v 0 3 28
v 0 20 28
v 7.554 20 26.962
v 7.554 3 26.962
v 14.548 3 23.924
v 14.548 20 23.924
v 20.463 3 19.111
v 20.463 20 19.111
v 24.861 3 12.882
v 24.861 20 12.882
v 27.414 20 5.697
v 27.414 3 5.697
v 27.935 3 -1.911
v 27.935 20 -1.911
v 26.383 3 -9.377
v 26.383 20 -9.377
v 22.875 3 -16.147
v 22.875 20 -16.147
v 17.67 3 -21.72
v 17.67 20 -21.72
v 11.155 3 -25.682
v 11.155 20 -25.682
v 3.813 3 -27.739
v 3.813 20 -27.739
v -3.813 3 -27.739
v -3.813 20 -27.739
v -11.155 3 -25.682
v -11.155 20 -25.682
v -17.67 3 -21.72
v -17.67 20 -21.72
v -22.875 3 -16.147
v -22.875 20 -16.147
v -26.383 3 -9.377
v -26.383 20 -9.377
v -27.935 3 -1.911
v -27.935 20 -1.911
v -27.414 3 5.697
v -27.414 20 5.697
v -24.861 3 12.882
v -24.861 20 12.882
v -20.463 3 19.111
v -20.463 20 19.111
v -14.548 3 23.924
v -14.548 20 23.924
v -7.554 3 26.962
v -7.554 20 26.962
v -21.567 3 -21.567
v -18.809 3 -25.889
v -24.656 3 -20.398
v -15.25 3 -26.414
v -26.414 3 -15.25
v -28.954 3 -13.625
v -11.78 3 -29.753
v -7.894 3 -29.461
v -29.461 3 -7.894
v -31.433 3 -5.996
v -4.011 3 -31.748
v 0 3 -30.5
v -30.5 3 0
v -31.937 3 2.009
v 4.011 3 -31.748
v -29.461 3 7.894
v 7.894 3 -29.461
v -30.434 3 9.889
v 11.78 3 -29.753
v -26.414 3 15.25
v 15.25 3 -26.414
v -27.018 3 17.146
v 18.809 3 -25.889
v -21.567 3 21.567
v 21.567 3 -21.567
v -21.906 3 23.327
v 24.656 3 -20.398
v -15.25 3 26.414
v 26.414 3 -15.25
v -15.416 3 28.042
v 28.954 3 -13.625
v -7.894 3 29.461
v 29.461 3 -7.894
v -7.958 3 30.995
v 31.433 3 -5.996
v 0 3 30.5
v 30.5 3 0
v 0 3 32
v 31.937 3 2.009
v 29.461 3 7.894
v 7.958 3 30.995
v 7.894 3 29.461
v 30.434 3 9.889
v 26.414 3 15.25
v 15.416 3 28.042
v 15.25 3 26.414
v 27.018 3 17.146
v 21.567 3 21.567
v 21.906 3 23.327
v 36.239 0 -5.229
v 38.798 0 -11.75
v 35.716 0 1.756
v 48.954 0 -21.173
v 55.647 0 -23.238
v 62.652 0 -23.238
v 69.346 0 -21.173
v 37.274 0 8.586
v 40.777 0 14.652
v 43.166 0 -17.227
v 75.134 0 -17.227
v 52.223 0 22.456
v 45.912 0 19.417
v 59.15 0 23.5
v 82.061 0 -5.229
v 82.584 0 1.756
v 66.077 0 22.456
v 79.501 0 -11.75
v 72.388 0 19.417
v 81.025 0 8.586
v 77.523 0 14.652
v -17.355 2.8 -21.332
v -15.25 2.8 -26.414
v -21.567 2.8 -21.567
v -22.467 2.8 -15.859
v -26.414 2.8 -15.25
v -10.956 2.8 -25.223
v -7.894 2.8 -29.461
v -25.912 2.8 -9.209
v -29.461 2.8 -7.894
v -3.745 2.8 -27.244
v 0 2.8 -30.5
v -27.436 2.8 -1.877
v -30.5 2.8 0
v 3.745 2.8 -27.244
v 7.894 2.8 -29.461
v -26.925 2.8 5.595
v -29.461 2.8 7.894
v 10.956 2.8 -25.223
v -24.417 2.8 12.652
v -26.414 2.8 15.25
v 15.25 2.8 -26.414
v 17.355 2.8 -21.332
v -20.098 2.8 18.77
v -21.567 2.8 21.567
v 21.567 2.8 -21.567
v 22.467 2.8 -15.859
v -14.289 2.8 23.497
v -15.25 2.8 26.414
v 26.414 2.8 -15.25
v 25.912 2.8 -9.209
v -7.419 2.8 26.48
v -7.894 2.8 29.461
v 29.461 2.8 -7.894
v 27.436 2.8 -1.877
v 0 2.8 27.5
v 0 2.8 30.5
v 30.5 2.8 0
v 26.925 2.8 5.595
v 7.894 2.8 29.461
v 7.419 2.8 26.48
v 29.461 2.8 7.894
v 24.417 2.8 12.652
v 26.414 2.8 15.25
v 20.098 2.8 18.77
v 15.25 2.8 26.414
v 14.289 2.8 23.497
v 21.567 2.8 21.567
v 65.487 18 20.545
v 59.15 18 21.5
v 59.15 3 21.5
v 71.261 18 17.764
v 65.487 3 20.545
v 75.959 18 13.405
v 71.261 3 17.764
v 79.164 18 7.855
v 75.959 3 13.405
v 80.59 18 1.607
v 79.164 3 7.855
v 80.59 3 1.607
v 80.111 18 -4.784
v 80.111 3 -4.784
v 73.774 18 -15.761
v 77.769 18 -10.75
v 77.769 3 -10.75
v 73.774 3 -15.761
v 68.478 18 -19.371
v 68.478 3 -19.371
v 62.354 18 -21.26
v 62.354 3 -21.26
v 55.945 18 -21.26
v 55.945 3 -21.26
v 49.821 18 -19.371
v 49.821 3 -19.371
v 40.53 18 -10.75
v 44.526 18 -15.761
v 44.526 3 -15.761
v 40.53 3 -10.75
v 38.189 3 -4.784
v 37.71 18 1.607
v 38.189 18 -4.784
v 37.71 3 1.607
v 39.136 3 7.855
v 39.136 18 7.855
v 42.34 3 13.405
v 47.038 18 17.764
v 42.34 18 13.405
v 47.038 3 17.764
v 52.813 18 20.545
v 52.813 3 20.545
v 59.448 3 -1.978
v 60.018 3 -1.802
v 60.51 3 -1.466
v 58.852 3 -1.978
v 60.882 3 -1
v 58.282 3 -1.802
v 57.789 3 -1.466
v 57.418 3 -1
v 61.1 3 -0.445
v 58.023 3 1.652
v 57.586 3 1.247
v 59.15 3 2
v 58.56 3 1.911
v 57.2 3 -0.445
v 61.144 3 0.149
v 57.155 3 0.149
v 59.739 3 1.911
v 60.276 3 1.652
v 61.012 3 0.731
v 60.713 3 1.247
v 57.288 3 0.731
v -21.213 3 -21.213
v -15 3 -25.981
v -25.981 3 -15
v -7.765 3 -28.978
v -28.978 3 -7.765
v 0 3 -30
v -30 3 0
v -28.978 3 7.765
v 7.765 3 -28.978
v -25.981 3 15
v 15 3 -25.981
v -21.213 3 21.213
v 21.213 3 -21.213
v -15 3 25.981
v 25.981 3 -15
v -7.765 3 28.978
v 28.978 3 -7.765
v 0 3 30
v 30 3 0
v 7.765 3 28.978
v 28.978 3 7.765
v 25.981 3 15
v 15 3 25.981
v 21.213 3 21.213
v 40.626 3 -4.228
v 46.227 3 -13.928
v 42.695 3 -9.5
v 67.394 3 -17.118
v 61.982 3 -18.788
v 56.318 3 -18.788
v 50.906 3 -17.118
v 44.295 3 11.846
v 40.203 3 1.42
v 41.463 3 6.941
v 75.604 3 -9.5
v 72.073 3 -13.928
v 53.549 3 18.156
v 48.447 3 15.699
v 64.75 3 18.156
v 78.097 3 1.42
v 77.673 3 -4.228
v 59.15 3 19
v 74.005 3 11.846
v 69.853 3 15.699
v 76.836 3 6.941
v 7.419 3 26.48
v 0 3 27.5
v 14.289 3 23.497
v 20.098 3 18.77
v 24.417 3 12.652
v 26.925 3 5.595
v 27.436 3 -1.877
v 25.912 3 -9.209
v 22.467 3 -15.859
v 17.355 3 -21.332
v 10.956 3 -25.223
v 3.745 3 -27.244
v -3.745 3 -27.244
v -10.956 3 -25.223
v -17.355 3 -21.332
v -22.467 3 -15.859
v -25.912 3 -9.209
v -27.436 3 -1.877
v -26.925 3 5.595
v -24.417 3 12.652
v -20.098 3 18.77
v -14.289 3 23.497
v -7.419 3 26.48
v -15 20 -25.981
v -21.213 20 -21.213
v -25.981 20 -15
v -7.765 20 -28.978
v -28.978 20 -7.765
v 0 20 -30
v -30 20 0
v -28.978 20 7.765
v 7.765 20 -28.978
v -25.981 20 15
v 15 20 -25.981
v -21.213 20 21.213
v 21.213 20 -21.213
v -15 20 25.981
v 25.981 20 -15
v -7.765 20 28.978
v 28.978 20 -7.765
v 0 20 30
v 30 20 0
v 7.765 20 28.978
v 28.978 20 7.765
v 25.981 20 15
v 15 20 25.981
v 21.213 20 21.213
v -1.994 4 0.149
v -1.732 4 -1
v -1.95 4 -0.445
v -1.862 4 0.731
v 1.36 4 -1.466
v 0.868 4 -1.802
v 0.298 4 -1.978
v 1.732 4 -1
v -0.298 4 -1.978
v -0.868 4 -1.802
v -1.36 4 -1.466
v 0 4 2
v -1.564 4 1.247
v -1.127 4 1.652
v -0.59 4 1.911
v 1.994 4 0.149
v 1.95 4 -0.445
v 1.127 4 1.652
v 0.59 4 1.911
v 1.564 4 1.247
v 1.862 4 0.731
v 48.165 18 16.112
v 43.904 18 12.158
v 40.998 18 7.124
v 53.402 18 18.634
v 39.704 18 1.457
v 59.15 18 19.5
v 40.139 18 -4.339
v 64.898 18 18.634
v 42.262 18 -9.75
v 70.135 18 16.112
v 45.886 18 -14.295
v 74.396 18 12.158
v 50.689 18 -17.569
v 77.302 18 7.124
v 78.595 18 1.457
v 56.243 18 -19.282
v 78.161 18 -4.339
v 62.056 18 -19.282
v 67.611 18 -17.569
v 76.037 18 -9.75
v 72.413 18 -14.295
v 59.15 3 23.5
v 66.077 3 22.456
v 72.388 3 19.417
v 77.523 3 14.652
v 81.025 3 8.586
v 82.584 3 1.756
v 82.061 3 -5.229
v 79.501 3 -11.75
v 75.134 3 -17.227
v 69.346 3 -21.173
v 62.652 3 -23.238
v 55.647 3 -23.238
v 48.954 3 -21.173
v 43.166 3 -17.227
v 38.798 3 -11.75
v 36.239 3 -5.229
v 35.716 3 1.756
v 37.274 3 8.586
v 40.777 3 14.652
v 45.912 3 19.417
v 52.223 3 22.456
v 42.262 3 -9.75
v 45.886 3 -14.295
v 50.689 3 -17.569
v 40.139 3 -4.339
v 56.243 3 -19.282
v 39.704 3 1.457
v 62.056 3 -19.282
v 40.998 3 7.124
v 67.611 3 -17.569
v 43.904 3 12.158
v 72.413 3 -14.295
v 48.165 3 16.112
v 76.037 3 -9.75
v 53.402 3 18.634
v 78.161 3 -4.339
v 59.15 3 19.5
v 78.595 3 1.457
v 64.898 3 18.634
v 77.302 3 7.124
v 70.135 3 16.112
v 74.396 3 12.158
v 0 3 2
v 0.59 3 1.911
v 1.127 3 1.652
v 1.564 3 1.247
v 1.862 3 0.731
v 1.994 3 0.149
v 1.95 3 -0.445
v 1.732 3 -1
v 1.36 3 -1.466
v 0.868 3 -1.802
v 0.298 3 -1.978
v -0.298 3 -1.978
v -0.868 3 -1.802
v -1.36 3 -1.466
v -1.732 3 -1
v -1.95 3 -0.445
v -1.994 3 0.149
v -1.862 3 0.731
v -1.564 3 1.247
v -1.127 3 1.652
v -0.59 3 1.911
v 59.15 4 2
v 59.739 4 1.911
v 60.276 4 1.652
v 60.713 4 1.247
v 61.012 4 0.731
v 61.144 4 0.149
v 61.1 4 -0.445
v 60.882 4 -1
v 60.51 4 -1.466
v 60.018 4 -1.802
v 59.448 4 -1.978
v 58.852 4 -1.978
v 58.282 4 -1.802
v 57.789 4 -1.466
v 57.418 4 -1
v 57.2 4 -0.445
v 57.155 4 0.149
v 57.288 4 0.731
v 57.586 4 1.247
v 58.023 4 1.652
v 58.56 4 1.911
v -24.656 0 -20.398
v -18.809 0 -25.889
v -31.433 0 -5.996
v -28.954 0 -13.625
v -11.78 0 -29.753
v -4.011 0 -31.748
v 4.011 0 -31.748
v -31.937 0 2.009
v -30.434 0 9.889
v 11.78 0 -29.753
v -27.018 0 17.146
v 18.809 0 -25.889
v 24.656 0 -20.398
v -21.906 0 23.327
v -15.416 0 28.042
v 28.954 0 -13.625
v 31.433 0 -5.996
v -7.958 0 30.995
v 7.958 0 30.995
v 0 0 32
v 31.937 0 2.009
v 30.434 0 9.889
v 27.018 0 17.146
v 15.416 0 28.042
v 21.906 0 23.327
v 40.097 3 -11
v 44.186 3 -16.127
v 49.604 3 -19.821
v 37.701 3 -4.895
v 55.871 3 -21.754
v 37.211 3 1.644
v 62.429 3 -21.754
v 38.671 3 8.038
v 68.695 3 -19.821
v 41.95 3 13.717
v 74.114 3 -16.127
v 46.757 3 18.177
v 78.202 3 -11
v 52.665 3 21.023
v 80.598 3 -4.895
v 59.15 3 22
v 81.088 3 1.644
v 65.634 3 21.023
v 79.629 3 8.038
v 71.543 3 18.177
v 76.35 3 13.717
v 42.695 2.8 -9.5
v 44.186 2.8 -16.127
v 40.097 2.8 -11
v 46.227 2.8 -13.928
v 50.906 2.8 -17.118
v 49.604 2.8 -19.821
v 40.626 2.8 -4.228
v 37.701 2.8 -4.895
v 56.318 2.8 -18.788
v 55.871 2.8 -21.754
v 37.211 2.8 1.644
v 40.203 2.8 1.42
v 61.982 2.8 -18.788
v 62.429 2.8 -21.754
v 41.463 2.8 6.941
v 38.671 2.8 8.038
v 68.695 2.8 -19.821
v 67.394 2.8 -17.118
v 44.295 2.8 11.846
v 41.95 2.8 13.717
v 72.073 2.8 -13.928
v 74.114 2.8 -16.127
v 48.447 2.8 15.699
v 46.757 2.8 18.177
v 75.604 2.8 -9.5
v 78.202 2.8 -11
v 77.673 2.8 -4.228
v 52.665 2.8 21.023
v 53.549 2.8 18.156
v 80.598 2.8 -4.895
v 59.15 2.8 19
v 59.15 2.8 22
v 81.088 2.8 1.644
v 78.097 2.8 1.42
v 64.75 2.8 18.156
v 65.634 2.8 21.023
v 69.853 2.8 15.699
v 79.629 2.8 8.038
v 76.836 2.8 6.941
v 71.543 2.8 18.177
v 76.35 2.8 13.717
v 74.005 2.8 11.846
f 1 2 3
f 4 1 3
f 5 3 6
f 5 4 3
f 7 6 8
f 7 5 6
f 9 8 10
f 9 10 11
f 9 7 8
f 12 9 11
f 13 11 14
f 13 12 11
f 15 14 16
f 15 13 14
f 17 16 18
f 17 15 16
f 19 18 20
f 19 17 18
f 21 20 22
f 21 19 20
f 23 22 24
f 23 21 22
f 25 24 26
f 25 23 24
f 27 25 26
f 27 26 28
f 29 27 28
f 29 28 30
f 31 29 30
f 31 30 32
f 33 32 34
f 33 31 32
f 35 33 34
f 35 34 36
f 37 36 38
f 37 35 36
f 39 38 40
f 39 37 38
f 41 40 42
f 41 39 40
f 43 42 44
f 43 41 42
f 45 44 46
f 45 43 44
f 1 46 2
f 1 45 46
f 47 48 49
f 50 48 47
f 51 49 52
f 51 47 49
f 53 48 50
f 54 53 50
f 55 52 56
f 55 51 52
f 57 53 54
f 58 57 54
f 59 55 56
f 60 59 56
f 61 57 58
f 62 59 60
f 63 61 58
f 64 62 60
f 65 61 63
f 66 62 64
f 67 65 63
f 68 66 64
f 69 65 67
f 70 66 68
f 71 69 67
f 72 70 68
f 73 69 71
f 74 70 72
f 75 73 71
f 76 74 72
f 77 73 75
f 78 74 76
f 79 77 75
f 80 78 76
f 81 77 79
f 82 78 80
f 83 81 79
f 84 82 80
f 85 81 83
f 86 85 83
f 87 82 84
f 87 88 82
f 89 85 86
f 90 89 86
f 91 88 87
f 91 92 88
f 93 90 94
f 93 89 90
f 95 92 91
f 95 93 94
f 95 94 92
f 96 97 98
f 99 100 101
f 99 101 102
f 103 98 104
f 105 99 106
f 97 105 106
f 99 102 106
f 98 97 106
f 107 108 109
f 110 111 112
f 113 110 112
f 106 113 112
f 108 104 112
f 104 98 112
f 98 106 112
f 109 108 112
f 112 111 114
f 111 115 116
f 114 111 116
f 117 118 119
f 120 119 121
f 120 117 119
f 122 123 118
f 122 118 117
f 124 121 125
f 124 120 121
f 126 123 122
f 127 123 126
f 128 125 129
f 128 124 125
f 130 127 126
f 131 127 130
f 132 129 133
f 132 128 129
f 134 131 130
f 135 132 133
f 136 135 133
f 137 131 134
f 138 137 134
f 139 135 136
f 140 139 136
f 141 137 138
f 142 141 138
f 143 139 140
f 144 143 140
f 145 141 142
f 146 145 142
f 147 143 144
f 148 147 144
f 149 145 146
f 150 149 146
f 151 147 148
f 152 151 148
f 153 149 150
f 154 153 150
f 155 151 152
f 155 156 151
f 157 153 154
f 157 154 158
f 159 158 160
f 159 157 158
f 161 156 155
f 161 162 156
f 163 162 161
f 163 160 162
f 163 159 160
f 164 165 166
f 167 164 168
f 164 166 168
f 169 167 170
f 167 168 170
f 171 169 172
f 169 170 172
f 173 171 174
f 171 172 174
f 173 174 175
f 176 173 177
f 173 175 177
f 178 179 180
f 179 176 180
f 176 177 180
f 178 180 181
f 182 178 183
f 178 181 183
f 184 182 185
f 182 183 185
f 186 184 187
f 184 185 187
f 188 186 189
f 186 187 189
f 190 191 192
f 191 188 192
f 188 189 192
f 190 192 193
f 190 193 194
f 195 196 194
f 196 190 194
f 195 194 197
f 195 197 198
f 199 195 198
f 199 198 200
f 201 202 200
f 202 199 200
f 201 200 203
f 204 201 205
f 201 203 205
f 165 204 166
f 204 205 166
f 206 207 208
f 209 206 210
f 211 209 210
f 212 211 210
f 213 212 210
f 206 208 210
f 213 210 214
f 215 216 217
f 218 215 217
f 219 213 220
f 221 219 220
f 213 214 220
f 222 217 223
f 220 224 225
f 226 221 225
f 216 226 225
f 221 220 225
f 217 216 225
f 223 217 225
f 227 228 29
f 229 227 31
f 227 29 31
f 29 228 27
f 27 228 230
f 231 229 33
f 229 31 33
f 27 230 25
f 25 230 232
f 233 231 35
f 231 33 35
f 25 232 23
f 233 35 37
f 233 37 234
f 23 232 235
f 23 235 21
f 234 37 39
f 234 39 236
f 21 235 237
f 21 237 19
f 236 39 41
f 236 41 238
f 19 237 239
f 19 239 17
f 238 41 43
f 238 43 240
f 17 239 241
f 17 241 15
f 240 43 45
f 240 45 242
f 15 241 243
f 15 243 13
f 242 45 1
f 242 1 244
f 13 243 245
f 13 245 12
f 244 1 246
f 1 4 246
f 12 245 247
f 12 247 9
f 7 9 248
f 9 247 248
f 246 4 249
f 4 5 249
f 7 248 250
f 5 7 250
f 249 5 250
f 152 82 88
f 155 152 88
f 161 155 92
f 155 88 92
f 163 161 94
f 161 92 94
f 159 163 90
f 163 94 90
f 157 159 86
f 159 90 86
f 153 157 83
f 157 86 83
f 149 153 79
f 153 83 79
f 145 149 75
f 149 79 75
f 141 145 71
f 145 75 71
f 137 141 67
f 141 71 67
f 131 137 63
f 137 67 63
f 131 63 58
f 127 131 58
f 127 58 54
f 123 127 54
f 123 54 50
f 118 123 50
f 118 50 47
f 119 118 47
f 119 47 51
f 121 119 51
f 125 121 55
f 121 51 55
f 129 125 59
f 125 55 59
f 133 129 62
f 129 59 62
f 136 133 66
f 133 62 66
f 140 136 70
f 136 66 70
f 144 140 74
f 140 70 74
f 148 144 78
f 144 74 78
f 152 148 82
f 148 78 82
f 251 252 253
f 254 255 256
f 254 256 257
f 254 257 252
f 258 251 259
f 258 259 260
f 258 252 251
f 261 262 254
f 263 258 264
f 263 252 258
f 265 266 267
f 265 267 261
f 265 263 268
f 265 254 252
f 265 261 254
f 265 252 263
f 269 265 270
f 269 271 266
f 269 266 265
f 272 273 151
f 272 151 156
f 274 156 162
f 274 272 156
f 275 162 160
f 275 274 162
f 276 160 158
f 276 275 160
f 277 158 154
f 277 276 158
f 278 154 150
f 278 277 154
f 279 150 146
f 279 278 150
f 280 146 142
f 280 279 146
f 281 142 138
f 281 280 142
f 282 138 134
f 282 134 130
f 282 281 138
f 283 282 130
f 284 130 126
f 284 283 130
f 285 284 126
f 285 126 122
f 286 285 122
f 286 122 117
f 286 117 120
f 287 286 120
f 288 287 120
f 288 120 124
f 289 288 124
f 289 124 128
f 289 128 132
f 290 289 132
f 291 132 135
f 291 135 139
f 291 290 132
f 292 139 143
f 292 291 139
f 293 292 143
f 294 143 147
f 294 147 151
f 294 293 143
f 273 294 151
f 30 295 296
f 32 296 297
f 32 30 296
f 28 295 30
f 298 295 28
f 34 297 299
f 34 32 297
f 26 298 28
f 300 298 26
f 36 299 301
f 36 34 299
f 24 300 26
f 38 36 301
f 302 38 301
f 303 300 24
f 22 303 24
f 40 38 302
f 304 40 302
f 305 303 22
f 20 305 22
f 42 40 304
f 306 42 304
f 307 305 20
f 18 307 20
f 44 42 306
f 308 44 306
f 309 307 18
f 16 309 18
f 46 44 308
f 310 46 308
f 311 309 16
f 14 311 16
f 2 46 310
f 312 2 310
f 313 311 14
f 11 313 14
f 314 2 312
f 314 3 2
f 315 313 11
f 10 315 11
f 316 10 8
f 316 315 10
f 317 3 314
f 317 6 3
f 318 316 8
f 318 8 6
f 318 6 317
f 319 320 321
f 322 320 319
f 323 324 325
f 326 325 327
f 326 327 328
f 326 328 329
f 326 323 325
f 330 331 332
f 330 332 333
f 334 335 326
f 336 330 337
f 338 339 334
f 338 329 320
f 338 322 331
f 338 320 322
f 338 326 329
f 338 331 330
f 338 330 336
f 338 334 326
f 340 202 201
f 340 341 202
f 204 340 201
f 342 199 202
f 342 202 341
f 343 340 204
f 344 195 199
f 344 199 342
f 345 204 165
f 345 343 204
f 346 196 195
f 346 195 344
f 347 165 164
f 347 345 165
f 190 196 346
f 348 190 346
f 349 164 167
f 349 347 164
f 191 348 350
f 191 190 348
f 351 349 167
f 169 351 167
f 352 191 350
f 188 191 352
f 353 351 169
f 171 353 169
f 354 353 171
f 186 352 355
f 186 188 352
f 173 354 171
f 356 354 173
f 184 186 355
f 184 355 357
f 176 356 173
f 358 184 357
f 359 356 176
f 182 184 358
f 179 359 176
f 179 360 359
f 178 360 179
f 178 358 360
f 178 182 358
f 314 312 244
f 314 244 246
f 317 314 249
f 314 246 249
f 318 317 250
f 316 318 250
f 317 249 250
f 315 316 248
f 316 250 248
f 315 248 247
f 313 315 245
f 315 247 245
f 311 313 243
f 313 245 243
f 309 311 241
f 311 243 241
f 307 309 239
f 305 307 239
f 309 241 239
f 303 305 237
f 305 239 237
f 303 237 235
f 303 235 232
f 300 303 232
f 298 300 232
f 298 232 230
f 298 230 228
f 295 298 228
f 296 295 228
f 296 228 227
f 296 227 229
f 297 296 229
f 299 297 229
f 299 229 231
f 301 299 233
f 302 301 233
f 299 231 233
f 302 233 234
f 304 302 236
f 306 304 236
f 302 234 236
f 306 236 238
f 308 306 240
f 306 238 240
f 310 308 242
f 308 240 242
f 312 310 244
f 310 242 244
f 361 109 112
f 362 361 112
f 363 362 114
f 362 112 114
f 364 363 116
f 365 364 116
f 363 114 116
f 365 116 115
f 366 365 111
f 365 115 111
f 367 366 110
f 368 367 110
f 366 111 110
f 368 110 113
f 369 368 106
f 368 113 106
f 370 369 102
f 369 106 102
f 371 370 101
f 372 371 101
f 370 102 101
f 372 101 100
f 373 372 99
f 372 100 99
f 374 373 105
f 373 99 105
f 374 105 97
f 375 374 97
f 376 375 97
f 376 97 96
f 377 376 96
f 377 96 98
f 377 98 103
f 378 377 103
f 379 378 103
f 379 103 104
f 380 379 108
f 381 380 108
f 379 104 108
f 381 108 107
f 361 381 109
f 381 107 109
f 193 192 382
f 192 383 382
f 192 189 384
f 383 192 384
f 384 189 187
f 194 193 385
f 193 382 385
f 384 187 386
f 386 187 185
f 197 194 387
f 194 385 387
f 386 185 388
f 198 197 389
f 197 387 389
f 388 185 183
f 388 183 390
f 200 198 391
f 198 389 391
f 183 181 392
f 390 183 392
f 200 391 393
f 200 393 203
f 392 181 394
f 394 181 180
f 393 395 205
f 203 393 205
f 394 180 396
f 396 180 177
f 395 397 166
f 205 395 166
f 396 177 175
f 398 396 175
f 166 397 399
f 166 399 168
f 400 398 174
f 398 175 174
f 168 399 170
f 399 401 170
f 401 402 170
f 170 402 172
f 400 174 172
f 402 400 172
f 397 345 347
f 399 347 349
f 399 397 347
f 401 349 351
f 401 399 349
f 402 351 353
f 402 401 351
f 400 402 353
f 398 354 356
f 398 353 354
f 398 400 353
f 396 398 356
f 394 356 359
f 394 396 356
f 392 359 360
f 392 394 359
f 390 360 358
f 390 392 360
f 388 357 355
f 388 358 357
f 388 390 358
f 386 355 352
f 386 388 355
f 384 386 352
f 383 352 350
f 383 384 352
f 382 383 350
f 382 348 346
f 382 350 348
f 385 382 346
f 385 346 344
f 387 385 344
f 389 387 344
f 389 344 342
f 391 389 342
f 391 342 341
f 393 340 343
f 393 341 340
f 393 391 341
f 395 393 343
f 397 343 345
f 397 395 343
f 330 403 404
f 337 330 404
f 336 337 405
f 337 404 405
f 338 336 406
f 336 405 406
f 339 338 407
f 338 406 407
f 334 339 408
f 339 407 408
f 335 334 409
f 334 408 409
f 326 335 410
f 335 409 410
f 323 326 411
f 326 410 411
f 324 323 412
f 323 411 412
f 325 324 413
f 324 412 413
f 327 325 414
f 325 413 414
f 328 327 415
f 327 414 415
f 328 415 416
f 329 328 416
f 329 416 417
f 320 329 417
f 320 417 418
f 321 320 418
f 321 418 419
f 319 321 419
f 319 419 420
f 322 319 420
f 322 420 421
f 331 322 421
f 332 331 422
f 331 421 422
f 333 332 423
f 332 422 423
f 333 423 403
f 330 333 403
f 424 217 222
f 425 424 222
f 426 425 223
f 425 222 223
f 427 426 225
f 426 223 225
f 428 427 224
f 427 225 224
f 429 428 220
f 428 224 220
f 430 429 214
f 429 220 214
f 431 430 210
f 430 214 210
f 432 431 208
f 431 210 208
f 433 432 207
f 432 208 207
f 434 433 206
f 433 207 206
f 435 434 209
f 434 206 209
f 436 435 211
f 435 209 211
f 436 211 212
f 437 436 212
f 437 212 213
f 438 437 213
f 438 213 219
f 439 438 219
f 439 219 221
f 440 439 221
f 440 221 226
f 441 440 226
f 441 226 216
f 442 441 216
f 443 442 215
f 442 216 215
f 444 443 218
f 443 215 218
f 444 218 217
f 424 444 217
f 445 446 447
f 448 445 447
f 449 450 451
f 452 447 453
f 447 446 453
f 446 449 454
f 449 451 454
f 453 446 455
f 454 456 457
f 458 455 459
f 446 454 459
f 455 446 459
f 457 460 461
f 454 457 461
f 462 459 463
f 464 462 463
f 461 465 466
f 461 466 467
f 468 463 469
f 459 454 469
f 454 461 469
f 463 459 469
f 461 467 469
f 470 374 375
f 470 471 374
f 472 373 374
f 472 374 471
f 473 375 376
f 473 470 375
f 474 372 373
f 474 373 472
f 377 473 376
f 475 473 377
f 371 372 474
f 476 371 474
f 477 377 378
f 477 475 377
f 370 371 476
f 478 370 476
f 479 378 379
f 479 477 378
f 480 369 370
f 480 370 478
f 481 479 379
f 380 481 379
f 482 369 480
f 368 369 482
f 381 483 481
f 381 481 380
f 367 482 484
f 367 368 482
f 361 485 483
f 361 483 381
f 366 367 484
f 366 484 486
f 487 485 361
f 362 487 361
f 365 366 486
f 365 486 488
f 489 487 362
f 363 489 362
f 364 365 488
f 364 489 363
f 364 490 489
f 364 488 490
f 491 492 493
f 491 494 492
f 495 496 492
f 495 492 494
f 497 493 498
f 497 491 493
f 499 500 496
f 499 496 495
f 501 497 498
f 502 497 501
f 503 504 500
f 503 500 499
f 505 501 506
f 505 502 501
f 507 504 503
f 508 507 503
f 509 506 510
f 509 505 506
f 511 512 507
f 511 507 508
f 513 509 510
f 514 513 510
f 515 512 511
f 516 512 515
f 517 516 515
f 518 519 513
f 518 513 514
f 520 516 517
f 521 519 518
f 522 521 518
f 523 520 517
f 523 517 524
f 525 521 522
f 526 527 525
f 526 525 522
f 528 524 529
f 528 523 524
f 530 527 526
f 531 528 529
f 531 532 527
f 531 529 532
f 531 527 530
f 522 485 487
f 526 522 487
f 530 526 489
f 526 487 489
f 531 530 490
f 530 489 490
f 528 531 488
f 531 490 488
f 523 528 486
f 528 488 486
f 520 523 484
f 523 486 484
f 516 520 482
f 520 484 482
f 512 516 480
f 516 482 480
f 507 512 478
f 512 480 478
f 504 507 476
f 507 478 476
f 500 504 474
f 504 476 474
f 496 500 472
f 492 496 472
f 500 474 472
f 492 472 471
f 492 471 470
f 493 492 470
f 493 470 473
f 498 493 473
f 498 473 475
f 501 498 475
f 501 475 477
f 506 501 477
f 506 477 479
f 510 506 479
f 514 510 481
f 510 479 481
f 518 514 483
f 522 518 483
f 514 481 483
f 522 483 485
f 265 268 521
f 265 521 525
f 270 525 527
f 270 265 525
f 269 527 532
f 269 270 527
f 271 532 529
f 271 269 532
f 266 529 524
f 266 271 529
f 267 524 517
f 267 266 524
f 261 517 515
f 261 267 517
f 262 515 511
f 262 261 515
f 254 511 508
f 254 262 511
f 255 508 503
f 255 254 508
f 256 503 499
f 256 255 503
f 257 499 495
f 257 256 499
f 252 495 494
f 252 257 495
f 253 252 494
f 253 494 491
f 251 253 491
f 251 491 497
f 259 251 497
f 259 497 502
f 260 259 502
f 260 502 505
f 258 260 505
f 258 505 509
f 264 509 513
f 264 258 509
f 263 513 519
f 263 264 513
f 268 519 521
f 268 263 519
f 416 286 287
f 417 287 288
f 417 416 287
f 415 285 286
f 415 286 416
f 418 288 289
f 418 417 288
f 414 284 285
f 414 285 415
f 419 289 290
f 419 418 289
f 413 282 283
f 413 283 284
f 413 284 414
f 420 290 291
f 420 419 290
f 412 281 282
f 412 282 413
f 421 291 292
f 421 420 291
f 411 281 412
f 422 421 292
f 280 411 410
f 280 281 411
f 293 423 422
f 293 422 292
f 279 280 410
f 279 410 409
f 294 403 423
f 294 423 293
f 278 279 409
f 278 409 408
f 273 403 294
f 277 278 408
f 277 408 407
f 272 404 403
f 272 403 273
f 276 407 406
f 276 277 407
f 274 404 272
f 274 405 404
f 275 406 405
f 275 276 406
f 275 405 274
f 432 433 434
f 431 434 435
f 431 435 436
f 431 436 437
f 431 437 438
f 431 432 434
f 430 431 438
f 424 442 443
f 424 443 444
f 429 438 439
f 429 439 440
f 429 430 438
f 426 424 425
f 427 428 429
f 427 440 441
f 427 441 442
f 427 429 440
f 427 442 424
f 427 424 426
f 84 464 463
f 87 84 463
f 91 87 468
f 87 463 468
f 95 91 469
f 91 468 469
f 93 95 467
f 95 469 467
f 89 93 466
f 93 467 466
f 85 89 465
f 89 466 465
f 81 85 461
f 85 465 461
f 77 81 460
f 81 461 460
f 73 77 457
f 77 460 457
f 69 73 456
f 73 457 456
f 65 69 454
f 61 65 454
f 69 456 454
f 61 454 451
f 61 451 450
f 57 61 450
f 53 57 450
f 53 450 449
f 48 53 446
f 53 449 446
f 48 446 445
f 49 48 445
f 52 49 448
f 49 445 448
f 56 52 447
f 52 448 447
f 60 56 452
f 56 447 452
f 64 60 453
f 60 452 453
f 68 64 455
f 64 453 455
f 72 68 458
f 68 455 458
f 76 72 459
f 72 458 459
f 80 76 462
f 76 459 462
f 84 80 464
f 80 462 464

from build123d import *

# Parameters (mm, degrees)
SKETCH_1_R          = 32
EXTRUDE_2_DEPTH     = 3
SKETCH_1_R_2        = 23.5
EXTRUDE_2_2_DEPTH   = 3
SKETCH_5_R          = 30.5
SKETCH_5_R_2        = 27.5
SKETCH_5_R_3        = 22
SKETCH_5_R_4        = 19
CUT_EXTRUDE_2_DEPTH = 0.2
SKETCH_6_R          = 30
SKETCH_6_R_2        = 28
EXTRUDE_5_DEPTH     = 17
SKETCH_6_R_3        = 21.5
SKETCH_6_R_4        = 19.5
EXTRUDE_5_2_DEPTH   = 17
SKETCH_7_R          = 2
EXTRUDE_6_DEPTH     = 1
SKETCH_9_R          = 24.43031199
CUT_EXTRUDE_3_DEPTH = 2


with BuildPart() as part:
    # Эскиз1 → Бобышка-Вытянуть2 (new body)
    with BuildSketch(Plane(origin=(0, 0, 0), x_dir=(1, 0, 0), z_dir=(0, 1, 0))):
        with Locations(Location((0, 0, 0), (0, 0, 270))):
            Circle(SKETCH_1_R)
    extrude(amount=EXTRUDE_2_DEPTH)


with BuildPart() as body_2:
    # Эскиз1 → Extrude 2 2 (new body)
    with BuildSketch(Plane(origin=(0, 0, 0), x_dir=(1, 0, 0), z_dir=(0, 1, 0))):
        with Locations(Location((59.149821763, 0, 0), (0, 0, 270))):
            Circle(SKETCH_1_R_2)
    extrude(amount=EXTRUDE_2_2_DEPTH)


with BuildPart() as cut_extrude_2_tool:
    # Эскиз5 → Вырез-Вытянуть2 (new body)
    # profile 1 of 2: a face of its own
    with BuildSketch(Plane(origin=(0, 3, 0), x_dir=(1, 0, 0), z_dir=(0, 1, 0))):
        with Locations(Location((0, 0, 0), (0, 0, 270))):
            Circle(SKETCH_5_R)
        with Locations(Location((0, 0, 0), (0, 0, 270))):
            Circle(SKETCH_5_R_2, mode=Mode.SUBTRACT)
    # profile 2 of 2: a face of its own
    with BuildSketch(Plane(origin=(0, 3, 0), x_dir=(1, 0, 0), z_dir=(0, 1, 0))):
        with Locations(Location((59.149821763, 0, 0), (0, 0, 270))):
            Circle(SKETCH_5_R_3)
        with Locations(Location((59.149821763, 0, 0), (0, 0, 270))):
            Circle(SKETCH_5_R_4, mode=Mode.SUBTRACT)
    extrude(amount=-CUT_EXTRUDE_2_DEPTH)


with BuildPart() as part_1:
    add(part.part)

    # Вырез-Вытянуть2: cut by cut_extrude_2_tool
    add(cut_extrude_2_tool.part, mode=Mode.SUBTRACT)

    # Эскиз7 → Бобышка-Вытянуть6 (add)
    with BuildSketch(Plane(origin=(0, 3, 0), x_dir=(1, 0, 0), z_dir=(0, 1, 0))):
        with Locations(Location((0, 0, 0), (0, 0, 270))):
            Circle(SKETCH_7_R)
        with Locations(Location((59.149821763, 0, 0), (0, 0, 270))):
            Circle(SKETCH_7_R)
    extrude(amount=EXTRUDE_6_DEPTH)


with BuildPart() as body_2_1:
    add(body_2.part)

    # Вырез-Вытянуть2: cut by cut_extrude_2_tool
    add(cut_extrude_2_tool.part, mode=Mode.SUBTRACT)


with BuildPart() as body_3:
    # Эскиз6 → Бобышка-Вытянуть5 (new body)
    with BuildSketch(Plane(origin=(0, 3, 0), x_dir=(1, 0, 0), z_dir=(0, 1, 0))):
        with Locations(Location((0, 0, 0), (0, 0, 270))):
            Circle(SKETCH_6_R)
        with Locations(Location((0, 0, 0), (0, 0, 270))):
            Circle(SKETCH_6_R_2, mode=Mode.SUBTRACT)
    extrude(amount=EXTRUDE_5_DEPTH)


with BuildPart() as body_4:
    # Эскиз6 → Extrude 5 2 (new body)
    with BuildSketch(Plane(origin=(0, 3, 0), x_dir=(1, 0, 0), z_dir=(0, 1, 0))):
        with Locations(Location((59.149821763, 0, 0), (0, 0, 270))):
            Circle(SKETCH_6_R_3)
        with Locations(Location((59.149821763, 0, 0), (0, 0, 270))):
            Circle(SKETCH_6_R_4, mode=Mode.SUBTRACT)
    extrude(amount=EXTRUDE_5_2_DEPTH)

    # Эскиз9 → Вырез-Вытянуть3 (cut)
    with BuildSketch(Plane(origin=(0, 20, 0), x_dir=(1, 0, 0), z_dir=(0, 1, 0))):
        with Locations((59.149821763, 0)):
            Circle(SKETCH_9_R)
    extrude(amount=-CUT_EXTRUDE_3_DEPTH, mode=Mode.SUBTRACT)


with BuildPart() as extrude_6_piece_1:
    # of the separate pieces the step leaves, piece 1, a body of its own (extrude_6_pieces)
    add(part_1.part.solids().sort_by_distance((0, 0, 32))[0])


with BuildPart() as extrude_6_piece_2:
    # of the separate pieces the step leaves, piece 2, a body of its own (extrude_6_pieces)
    add(part_1.part.solids().sort_by_distance((59.149821763, 3, 2))[0])


solid = Compound([body_2_1.part, body_3.part, body_4.part, extrude_6_piece_1.part, extrude_6_piece_2.part])
